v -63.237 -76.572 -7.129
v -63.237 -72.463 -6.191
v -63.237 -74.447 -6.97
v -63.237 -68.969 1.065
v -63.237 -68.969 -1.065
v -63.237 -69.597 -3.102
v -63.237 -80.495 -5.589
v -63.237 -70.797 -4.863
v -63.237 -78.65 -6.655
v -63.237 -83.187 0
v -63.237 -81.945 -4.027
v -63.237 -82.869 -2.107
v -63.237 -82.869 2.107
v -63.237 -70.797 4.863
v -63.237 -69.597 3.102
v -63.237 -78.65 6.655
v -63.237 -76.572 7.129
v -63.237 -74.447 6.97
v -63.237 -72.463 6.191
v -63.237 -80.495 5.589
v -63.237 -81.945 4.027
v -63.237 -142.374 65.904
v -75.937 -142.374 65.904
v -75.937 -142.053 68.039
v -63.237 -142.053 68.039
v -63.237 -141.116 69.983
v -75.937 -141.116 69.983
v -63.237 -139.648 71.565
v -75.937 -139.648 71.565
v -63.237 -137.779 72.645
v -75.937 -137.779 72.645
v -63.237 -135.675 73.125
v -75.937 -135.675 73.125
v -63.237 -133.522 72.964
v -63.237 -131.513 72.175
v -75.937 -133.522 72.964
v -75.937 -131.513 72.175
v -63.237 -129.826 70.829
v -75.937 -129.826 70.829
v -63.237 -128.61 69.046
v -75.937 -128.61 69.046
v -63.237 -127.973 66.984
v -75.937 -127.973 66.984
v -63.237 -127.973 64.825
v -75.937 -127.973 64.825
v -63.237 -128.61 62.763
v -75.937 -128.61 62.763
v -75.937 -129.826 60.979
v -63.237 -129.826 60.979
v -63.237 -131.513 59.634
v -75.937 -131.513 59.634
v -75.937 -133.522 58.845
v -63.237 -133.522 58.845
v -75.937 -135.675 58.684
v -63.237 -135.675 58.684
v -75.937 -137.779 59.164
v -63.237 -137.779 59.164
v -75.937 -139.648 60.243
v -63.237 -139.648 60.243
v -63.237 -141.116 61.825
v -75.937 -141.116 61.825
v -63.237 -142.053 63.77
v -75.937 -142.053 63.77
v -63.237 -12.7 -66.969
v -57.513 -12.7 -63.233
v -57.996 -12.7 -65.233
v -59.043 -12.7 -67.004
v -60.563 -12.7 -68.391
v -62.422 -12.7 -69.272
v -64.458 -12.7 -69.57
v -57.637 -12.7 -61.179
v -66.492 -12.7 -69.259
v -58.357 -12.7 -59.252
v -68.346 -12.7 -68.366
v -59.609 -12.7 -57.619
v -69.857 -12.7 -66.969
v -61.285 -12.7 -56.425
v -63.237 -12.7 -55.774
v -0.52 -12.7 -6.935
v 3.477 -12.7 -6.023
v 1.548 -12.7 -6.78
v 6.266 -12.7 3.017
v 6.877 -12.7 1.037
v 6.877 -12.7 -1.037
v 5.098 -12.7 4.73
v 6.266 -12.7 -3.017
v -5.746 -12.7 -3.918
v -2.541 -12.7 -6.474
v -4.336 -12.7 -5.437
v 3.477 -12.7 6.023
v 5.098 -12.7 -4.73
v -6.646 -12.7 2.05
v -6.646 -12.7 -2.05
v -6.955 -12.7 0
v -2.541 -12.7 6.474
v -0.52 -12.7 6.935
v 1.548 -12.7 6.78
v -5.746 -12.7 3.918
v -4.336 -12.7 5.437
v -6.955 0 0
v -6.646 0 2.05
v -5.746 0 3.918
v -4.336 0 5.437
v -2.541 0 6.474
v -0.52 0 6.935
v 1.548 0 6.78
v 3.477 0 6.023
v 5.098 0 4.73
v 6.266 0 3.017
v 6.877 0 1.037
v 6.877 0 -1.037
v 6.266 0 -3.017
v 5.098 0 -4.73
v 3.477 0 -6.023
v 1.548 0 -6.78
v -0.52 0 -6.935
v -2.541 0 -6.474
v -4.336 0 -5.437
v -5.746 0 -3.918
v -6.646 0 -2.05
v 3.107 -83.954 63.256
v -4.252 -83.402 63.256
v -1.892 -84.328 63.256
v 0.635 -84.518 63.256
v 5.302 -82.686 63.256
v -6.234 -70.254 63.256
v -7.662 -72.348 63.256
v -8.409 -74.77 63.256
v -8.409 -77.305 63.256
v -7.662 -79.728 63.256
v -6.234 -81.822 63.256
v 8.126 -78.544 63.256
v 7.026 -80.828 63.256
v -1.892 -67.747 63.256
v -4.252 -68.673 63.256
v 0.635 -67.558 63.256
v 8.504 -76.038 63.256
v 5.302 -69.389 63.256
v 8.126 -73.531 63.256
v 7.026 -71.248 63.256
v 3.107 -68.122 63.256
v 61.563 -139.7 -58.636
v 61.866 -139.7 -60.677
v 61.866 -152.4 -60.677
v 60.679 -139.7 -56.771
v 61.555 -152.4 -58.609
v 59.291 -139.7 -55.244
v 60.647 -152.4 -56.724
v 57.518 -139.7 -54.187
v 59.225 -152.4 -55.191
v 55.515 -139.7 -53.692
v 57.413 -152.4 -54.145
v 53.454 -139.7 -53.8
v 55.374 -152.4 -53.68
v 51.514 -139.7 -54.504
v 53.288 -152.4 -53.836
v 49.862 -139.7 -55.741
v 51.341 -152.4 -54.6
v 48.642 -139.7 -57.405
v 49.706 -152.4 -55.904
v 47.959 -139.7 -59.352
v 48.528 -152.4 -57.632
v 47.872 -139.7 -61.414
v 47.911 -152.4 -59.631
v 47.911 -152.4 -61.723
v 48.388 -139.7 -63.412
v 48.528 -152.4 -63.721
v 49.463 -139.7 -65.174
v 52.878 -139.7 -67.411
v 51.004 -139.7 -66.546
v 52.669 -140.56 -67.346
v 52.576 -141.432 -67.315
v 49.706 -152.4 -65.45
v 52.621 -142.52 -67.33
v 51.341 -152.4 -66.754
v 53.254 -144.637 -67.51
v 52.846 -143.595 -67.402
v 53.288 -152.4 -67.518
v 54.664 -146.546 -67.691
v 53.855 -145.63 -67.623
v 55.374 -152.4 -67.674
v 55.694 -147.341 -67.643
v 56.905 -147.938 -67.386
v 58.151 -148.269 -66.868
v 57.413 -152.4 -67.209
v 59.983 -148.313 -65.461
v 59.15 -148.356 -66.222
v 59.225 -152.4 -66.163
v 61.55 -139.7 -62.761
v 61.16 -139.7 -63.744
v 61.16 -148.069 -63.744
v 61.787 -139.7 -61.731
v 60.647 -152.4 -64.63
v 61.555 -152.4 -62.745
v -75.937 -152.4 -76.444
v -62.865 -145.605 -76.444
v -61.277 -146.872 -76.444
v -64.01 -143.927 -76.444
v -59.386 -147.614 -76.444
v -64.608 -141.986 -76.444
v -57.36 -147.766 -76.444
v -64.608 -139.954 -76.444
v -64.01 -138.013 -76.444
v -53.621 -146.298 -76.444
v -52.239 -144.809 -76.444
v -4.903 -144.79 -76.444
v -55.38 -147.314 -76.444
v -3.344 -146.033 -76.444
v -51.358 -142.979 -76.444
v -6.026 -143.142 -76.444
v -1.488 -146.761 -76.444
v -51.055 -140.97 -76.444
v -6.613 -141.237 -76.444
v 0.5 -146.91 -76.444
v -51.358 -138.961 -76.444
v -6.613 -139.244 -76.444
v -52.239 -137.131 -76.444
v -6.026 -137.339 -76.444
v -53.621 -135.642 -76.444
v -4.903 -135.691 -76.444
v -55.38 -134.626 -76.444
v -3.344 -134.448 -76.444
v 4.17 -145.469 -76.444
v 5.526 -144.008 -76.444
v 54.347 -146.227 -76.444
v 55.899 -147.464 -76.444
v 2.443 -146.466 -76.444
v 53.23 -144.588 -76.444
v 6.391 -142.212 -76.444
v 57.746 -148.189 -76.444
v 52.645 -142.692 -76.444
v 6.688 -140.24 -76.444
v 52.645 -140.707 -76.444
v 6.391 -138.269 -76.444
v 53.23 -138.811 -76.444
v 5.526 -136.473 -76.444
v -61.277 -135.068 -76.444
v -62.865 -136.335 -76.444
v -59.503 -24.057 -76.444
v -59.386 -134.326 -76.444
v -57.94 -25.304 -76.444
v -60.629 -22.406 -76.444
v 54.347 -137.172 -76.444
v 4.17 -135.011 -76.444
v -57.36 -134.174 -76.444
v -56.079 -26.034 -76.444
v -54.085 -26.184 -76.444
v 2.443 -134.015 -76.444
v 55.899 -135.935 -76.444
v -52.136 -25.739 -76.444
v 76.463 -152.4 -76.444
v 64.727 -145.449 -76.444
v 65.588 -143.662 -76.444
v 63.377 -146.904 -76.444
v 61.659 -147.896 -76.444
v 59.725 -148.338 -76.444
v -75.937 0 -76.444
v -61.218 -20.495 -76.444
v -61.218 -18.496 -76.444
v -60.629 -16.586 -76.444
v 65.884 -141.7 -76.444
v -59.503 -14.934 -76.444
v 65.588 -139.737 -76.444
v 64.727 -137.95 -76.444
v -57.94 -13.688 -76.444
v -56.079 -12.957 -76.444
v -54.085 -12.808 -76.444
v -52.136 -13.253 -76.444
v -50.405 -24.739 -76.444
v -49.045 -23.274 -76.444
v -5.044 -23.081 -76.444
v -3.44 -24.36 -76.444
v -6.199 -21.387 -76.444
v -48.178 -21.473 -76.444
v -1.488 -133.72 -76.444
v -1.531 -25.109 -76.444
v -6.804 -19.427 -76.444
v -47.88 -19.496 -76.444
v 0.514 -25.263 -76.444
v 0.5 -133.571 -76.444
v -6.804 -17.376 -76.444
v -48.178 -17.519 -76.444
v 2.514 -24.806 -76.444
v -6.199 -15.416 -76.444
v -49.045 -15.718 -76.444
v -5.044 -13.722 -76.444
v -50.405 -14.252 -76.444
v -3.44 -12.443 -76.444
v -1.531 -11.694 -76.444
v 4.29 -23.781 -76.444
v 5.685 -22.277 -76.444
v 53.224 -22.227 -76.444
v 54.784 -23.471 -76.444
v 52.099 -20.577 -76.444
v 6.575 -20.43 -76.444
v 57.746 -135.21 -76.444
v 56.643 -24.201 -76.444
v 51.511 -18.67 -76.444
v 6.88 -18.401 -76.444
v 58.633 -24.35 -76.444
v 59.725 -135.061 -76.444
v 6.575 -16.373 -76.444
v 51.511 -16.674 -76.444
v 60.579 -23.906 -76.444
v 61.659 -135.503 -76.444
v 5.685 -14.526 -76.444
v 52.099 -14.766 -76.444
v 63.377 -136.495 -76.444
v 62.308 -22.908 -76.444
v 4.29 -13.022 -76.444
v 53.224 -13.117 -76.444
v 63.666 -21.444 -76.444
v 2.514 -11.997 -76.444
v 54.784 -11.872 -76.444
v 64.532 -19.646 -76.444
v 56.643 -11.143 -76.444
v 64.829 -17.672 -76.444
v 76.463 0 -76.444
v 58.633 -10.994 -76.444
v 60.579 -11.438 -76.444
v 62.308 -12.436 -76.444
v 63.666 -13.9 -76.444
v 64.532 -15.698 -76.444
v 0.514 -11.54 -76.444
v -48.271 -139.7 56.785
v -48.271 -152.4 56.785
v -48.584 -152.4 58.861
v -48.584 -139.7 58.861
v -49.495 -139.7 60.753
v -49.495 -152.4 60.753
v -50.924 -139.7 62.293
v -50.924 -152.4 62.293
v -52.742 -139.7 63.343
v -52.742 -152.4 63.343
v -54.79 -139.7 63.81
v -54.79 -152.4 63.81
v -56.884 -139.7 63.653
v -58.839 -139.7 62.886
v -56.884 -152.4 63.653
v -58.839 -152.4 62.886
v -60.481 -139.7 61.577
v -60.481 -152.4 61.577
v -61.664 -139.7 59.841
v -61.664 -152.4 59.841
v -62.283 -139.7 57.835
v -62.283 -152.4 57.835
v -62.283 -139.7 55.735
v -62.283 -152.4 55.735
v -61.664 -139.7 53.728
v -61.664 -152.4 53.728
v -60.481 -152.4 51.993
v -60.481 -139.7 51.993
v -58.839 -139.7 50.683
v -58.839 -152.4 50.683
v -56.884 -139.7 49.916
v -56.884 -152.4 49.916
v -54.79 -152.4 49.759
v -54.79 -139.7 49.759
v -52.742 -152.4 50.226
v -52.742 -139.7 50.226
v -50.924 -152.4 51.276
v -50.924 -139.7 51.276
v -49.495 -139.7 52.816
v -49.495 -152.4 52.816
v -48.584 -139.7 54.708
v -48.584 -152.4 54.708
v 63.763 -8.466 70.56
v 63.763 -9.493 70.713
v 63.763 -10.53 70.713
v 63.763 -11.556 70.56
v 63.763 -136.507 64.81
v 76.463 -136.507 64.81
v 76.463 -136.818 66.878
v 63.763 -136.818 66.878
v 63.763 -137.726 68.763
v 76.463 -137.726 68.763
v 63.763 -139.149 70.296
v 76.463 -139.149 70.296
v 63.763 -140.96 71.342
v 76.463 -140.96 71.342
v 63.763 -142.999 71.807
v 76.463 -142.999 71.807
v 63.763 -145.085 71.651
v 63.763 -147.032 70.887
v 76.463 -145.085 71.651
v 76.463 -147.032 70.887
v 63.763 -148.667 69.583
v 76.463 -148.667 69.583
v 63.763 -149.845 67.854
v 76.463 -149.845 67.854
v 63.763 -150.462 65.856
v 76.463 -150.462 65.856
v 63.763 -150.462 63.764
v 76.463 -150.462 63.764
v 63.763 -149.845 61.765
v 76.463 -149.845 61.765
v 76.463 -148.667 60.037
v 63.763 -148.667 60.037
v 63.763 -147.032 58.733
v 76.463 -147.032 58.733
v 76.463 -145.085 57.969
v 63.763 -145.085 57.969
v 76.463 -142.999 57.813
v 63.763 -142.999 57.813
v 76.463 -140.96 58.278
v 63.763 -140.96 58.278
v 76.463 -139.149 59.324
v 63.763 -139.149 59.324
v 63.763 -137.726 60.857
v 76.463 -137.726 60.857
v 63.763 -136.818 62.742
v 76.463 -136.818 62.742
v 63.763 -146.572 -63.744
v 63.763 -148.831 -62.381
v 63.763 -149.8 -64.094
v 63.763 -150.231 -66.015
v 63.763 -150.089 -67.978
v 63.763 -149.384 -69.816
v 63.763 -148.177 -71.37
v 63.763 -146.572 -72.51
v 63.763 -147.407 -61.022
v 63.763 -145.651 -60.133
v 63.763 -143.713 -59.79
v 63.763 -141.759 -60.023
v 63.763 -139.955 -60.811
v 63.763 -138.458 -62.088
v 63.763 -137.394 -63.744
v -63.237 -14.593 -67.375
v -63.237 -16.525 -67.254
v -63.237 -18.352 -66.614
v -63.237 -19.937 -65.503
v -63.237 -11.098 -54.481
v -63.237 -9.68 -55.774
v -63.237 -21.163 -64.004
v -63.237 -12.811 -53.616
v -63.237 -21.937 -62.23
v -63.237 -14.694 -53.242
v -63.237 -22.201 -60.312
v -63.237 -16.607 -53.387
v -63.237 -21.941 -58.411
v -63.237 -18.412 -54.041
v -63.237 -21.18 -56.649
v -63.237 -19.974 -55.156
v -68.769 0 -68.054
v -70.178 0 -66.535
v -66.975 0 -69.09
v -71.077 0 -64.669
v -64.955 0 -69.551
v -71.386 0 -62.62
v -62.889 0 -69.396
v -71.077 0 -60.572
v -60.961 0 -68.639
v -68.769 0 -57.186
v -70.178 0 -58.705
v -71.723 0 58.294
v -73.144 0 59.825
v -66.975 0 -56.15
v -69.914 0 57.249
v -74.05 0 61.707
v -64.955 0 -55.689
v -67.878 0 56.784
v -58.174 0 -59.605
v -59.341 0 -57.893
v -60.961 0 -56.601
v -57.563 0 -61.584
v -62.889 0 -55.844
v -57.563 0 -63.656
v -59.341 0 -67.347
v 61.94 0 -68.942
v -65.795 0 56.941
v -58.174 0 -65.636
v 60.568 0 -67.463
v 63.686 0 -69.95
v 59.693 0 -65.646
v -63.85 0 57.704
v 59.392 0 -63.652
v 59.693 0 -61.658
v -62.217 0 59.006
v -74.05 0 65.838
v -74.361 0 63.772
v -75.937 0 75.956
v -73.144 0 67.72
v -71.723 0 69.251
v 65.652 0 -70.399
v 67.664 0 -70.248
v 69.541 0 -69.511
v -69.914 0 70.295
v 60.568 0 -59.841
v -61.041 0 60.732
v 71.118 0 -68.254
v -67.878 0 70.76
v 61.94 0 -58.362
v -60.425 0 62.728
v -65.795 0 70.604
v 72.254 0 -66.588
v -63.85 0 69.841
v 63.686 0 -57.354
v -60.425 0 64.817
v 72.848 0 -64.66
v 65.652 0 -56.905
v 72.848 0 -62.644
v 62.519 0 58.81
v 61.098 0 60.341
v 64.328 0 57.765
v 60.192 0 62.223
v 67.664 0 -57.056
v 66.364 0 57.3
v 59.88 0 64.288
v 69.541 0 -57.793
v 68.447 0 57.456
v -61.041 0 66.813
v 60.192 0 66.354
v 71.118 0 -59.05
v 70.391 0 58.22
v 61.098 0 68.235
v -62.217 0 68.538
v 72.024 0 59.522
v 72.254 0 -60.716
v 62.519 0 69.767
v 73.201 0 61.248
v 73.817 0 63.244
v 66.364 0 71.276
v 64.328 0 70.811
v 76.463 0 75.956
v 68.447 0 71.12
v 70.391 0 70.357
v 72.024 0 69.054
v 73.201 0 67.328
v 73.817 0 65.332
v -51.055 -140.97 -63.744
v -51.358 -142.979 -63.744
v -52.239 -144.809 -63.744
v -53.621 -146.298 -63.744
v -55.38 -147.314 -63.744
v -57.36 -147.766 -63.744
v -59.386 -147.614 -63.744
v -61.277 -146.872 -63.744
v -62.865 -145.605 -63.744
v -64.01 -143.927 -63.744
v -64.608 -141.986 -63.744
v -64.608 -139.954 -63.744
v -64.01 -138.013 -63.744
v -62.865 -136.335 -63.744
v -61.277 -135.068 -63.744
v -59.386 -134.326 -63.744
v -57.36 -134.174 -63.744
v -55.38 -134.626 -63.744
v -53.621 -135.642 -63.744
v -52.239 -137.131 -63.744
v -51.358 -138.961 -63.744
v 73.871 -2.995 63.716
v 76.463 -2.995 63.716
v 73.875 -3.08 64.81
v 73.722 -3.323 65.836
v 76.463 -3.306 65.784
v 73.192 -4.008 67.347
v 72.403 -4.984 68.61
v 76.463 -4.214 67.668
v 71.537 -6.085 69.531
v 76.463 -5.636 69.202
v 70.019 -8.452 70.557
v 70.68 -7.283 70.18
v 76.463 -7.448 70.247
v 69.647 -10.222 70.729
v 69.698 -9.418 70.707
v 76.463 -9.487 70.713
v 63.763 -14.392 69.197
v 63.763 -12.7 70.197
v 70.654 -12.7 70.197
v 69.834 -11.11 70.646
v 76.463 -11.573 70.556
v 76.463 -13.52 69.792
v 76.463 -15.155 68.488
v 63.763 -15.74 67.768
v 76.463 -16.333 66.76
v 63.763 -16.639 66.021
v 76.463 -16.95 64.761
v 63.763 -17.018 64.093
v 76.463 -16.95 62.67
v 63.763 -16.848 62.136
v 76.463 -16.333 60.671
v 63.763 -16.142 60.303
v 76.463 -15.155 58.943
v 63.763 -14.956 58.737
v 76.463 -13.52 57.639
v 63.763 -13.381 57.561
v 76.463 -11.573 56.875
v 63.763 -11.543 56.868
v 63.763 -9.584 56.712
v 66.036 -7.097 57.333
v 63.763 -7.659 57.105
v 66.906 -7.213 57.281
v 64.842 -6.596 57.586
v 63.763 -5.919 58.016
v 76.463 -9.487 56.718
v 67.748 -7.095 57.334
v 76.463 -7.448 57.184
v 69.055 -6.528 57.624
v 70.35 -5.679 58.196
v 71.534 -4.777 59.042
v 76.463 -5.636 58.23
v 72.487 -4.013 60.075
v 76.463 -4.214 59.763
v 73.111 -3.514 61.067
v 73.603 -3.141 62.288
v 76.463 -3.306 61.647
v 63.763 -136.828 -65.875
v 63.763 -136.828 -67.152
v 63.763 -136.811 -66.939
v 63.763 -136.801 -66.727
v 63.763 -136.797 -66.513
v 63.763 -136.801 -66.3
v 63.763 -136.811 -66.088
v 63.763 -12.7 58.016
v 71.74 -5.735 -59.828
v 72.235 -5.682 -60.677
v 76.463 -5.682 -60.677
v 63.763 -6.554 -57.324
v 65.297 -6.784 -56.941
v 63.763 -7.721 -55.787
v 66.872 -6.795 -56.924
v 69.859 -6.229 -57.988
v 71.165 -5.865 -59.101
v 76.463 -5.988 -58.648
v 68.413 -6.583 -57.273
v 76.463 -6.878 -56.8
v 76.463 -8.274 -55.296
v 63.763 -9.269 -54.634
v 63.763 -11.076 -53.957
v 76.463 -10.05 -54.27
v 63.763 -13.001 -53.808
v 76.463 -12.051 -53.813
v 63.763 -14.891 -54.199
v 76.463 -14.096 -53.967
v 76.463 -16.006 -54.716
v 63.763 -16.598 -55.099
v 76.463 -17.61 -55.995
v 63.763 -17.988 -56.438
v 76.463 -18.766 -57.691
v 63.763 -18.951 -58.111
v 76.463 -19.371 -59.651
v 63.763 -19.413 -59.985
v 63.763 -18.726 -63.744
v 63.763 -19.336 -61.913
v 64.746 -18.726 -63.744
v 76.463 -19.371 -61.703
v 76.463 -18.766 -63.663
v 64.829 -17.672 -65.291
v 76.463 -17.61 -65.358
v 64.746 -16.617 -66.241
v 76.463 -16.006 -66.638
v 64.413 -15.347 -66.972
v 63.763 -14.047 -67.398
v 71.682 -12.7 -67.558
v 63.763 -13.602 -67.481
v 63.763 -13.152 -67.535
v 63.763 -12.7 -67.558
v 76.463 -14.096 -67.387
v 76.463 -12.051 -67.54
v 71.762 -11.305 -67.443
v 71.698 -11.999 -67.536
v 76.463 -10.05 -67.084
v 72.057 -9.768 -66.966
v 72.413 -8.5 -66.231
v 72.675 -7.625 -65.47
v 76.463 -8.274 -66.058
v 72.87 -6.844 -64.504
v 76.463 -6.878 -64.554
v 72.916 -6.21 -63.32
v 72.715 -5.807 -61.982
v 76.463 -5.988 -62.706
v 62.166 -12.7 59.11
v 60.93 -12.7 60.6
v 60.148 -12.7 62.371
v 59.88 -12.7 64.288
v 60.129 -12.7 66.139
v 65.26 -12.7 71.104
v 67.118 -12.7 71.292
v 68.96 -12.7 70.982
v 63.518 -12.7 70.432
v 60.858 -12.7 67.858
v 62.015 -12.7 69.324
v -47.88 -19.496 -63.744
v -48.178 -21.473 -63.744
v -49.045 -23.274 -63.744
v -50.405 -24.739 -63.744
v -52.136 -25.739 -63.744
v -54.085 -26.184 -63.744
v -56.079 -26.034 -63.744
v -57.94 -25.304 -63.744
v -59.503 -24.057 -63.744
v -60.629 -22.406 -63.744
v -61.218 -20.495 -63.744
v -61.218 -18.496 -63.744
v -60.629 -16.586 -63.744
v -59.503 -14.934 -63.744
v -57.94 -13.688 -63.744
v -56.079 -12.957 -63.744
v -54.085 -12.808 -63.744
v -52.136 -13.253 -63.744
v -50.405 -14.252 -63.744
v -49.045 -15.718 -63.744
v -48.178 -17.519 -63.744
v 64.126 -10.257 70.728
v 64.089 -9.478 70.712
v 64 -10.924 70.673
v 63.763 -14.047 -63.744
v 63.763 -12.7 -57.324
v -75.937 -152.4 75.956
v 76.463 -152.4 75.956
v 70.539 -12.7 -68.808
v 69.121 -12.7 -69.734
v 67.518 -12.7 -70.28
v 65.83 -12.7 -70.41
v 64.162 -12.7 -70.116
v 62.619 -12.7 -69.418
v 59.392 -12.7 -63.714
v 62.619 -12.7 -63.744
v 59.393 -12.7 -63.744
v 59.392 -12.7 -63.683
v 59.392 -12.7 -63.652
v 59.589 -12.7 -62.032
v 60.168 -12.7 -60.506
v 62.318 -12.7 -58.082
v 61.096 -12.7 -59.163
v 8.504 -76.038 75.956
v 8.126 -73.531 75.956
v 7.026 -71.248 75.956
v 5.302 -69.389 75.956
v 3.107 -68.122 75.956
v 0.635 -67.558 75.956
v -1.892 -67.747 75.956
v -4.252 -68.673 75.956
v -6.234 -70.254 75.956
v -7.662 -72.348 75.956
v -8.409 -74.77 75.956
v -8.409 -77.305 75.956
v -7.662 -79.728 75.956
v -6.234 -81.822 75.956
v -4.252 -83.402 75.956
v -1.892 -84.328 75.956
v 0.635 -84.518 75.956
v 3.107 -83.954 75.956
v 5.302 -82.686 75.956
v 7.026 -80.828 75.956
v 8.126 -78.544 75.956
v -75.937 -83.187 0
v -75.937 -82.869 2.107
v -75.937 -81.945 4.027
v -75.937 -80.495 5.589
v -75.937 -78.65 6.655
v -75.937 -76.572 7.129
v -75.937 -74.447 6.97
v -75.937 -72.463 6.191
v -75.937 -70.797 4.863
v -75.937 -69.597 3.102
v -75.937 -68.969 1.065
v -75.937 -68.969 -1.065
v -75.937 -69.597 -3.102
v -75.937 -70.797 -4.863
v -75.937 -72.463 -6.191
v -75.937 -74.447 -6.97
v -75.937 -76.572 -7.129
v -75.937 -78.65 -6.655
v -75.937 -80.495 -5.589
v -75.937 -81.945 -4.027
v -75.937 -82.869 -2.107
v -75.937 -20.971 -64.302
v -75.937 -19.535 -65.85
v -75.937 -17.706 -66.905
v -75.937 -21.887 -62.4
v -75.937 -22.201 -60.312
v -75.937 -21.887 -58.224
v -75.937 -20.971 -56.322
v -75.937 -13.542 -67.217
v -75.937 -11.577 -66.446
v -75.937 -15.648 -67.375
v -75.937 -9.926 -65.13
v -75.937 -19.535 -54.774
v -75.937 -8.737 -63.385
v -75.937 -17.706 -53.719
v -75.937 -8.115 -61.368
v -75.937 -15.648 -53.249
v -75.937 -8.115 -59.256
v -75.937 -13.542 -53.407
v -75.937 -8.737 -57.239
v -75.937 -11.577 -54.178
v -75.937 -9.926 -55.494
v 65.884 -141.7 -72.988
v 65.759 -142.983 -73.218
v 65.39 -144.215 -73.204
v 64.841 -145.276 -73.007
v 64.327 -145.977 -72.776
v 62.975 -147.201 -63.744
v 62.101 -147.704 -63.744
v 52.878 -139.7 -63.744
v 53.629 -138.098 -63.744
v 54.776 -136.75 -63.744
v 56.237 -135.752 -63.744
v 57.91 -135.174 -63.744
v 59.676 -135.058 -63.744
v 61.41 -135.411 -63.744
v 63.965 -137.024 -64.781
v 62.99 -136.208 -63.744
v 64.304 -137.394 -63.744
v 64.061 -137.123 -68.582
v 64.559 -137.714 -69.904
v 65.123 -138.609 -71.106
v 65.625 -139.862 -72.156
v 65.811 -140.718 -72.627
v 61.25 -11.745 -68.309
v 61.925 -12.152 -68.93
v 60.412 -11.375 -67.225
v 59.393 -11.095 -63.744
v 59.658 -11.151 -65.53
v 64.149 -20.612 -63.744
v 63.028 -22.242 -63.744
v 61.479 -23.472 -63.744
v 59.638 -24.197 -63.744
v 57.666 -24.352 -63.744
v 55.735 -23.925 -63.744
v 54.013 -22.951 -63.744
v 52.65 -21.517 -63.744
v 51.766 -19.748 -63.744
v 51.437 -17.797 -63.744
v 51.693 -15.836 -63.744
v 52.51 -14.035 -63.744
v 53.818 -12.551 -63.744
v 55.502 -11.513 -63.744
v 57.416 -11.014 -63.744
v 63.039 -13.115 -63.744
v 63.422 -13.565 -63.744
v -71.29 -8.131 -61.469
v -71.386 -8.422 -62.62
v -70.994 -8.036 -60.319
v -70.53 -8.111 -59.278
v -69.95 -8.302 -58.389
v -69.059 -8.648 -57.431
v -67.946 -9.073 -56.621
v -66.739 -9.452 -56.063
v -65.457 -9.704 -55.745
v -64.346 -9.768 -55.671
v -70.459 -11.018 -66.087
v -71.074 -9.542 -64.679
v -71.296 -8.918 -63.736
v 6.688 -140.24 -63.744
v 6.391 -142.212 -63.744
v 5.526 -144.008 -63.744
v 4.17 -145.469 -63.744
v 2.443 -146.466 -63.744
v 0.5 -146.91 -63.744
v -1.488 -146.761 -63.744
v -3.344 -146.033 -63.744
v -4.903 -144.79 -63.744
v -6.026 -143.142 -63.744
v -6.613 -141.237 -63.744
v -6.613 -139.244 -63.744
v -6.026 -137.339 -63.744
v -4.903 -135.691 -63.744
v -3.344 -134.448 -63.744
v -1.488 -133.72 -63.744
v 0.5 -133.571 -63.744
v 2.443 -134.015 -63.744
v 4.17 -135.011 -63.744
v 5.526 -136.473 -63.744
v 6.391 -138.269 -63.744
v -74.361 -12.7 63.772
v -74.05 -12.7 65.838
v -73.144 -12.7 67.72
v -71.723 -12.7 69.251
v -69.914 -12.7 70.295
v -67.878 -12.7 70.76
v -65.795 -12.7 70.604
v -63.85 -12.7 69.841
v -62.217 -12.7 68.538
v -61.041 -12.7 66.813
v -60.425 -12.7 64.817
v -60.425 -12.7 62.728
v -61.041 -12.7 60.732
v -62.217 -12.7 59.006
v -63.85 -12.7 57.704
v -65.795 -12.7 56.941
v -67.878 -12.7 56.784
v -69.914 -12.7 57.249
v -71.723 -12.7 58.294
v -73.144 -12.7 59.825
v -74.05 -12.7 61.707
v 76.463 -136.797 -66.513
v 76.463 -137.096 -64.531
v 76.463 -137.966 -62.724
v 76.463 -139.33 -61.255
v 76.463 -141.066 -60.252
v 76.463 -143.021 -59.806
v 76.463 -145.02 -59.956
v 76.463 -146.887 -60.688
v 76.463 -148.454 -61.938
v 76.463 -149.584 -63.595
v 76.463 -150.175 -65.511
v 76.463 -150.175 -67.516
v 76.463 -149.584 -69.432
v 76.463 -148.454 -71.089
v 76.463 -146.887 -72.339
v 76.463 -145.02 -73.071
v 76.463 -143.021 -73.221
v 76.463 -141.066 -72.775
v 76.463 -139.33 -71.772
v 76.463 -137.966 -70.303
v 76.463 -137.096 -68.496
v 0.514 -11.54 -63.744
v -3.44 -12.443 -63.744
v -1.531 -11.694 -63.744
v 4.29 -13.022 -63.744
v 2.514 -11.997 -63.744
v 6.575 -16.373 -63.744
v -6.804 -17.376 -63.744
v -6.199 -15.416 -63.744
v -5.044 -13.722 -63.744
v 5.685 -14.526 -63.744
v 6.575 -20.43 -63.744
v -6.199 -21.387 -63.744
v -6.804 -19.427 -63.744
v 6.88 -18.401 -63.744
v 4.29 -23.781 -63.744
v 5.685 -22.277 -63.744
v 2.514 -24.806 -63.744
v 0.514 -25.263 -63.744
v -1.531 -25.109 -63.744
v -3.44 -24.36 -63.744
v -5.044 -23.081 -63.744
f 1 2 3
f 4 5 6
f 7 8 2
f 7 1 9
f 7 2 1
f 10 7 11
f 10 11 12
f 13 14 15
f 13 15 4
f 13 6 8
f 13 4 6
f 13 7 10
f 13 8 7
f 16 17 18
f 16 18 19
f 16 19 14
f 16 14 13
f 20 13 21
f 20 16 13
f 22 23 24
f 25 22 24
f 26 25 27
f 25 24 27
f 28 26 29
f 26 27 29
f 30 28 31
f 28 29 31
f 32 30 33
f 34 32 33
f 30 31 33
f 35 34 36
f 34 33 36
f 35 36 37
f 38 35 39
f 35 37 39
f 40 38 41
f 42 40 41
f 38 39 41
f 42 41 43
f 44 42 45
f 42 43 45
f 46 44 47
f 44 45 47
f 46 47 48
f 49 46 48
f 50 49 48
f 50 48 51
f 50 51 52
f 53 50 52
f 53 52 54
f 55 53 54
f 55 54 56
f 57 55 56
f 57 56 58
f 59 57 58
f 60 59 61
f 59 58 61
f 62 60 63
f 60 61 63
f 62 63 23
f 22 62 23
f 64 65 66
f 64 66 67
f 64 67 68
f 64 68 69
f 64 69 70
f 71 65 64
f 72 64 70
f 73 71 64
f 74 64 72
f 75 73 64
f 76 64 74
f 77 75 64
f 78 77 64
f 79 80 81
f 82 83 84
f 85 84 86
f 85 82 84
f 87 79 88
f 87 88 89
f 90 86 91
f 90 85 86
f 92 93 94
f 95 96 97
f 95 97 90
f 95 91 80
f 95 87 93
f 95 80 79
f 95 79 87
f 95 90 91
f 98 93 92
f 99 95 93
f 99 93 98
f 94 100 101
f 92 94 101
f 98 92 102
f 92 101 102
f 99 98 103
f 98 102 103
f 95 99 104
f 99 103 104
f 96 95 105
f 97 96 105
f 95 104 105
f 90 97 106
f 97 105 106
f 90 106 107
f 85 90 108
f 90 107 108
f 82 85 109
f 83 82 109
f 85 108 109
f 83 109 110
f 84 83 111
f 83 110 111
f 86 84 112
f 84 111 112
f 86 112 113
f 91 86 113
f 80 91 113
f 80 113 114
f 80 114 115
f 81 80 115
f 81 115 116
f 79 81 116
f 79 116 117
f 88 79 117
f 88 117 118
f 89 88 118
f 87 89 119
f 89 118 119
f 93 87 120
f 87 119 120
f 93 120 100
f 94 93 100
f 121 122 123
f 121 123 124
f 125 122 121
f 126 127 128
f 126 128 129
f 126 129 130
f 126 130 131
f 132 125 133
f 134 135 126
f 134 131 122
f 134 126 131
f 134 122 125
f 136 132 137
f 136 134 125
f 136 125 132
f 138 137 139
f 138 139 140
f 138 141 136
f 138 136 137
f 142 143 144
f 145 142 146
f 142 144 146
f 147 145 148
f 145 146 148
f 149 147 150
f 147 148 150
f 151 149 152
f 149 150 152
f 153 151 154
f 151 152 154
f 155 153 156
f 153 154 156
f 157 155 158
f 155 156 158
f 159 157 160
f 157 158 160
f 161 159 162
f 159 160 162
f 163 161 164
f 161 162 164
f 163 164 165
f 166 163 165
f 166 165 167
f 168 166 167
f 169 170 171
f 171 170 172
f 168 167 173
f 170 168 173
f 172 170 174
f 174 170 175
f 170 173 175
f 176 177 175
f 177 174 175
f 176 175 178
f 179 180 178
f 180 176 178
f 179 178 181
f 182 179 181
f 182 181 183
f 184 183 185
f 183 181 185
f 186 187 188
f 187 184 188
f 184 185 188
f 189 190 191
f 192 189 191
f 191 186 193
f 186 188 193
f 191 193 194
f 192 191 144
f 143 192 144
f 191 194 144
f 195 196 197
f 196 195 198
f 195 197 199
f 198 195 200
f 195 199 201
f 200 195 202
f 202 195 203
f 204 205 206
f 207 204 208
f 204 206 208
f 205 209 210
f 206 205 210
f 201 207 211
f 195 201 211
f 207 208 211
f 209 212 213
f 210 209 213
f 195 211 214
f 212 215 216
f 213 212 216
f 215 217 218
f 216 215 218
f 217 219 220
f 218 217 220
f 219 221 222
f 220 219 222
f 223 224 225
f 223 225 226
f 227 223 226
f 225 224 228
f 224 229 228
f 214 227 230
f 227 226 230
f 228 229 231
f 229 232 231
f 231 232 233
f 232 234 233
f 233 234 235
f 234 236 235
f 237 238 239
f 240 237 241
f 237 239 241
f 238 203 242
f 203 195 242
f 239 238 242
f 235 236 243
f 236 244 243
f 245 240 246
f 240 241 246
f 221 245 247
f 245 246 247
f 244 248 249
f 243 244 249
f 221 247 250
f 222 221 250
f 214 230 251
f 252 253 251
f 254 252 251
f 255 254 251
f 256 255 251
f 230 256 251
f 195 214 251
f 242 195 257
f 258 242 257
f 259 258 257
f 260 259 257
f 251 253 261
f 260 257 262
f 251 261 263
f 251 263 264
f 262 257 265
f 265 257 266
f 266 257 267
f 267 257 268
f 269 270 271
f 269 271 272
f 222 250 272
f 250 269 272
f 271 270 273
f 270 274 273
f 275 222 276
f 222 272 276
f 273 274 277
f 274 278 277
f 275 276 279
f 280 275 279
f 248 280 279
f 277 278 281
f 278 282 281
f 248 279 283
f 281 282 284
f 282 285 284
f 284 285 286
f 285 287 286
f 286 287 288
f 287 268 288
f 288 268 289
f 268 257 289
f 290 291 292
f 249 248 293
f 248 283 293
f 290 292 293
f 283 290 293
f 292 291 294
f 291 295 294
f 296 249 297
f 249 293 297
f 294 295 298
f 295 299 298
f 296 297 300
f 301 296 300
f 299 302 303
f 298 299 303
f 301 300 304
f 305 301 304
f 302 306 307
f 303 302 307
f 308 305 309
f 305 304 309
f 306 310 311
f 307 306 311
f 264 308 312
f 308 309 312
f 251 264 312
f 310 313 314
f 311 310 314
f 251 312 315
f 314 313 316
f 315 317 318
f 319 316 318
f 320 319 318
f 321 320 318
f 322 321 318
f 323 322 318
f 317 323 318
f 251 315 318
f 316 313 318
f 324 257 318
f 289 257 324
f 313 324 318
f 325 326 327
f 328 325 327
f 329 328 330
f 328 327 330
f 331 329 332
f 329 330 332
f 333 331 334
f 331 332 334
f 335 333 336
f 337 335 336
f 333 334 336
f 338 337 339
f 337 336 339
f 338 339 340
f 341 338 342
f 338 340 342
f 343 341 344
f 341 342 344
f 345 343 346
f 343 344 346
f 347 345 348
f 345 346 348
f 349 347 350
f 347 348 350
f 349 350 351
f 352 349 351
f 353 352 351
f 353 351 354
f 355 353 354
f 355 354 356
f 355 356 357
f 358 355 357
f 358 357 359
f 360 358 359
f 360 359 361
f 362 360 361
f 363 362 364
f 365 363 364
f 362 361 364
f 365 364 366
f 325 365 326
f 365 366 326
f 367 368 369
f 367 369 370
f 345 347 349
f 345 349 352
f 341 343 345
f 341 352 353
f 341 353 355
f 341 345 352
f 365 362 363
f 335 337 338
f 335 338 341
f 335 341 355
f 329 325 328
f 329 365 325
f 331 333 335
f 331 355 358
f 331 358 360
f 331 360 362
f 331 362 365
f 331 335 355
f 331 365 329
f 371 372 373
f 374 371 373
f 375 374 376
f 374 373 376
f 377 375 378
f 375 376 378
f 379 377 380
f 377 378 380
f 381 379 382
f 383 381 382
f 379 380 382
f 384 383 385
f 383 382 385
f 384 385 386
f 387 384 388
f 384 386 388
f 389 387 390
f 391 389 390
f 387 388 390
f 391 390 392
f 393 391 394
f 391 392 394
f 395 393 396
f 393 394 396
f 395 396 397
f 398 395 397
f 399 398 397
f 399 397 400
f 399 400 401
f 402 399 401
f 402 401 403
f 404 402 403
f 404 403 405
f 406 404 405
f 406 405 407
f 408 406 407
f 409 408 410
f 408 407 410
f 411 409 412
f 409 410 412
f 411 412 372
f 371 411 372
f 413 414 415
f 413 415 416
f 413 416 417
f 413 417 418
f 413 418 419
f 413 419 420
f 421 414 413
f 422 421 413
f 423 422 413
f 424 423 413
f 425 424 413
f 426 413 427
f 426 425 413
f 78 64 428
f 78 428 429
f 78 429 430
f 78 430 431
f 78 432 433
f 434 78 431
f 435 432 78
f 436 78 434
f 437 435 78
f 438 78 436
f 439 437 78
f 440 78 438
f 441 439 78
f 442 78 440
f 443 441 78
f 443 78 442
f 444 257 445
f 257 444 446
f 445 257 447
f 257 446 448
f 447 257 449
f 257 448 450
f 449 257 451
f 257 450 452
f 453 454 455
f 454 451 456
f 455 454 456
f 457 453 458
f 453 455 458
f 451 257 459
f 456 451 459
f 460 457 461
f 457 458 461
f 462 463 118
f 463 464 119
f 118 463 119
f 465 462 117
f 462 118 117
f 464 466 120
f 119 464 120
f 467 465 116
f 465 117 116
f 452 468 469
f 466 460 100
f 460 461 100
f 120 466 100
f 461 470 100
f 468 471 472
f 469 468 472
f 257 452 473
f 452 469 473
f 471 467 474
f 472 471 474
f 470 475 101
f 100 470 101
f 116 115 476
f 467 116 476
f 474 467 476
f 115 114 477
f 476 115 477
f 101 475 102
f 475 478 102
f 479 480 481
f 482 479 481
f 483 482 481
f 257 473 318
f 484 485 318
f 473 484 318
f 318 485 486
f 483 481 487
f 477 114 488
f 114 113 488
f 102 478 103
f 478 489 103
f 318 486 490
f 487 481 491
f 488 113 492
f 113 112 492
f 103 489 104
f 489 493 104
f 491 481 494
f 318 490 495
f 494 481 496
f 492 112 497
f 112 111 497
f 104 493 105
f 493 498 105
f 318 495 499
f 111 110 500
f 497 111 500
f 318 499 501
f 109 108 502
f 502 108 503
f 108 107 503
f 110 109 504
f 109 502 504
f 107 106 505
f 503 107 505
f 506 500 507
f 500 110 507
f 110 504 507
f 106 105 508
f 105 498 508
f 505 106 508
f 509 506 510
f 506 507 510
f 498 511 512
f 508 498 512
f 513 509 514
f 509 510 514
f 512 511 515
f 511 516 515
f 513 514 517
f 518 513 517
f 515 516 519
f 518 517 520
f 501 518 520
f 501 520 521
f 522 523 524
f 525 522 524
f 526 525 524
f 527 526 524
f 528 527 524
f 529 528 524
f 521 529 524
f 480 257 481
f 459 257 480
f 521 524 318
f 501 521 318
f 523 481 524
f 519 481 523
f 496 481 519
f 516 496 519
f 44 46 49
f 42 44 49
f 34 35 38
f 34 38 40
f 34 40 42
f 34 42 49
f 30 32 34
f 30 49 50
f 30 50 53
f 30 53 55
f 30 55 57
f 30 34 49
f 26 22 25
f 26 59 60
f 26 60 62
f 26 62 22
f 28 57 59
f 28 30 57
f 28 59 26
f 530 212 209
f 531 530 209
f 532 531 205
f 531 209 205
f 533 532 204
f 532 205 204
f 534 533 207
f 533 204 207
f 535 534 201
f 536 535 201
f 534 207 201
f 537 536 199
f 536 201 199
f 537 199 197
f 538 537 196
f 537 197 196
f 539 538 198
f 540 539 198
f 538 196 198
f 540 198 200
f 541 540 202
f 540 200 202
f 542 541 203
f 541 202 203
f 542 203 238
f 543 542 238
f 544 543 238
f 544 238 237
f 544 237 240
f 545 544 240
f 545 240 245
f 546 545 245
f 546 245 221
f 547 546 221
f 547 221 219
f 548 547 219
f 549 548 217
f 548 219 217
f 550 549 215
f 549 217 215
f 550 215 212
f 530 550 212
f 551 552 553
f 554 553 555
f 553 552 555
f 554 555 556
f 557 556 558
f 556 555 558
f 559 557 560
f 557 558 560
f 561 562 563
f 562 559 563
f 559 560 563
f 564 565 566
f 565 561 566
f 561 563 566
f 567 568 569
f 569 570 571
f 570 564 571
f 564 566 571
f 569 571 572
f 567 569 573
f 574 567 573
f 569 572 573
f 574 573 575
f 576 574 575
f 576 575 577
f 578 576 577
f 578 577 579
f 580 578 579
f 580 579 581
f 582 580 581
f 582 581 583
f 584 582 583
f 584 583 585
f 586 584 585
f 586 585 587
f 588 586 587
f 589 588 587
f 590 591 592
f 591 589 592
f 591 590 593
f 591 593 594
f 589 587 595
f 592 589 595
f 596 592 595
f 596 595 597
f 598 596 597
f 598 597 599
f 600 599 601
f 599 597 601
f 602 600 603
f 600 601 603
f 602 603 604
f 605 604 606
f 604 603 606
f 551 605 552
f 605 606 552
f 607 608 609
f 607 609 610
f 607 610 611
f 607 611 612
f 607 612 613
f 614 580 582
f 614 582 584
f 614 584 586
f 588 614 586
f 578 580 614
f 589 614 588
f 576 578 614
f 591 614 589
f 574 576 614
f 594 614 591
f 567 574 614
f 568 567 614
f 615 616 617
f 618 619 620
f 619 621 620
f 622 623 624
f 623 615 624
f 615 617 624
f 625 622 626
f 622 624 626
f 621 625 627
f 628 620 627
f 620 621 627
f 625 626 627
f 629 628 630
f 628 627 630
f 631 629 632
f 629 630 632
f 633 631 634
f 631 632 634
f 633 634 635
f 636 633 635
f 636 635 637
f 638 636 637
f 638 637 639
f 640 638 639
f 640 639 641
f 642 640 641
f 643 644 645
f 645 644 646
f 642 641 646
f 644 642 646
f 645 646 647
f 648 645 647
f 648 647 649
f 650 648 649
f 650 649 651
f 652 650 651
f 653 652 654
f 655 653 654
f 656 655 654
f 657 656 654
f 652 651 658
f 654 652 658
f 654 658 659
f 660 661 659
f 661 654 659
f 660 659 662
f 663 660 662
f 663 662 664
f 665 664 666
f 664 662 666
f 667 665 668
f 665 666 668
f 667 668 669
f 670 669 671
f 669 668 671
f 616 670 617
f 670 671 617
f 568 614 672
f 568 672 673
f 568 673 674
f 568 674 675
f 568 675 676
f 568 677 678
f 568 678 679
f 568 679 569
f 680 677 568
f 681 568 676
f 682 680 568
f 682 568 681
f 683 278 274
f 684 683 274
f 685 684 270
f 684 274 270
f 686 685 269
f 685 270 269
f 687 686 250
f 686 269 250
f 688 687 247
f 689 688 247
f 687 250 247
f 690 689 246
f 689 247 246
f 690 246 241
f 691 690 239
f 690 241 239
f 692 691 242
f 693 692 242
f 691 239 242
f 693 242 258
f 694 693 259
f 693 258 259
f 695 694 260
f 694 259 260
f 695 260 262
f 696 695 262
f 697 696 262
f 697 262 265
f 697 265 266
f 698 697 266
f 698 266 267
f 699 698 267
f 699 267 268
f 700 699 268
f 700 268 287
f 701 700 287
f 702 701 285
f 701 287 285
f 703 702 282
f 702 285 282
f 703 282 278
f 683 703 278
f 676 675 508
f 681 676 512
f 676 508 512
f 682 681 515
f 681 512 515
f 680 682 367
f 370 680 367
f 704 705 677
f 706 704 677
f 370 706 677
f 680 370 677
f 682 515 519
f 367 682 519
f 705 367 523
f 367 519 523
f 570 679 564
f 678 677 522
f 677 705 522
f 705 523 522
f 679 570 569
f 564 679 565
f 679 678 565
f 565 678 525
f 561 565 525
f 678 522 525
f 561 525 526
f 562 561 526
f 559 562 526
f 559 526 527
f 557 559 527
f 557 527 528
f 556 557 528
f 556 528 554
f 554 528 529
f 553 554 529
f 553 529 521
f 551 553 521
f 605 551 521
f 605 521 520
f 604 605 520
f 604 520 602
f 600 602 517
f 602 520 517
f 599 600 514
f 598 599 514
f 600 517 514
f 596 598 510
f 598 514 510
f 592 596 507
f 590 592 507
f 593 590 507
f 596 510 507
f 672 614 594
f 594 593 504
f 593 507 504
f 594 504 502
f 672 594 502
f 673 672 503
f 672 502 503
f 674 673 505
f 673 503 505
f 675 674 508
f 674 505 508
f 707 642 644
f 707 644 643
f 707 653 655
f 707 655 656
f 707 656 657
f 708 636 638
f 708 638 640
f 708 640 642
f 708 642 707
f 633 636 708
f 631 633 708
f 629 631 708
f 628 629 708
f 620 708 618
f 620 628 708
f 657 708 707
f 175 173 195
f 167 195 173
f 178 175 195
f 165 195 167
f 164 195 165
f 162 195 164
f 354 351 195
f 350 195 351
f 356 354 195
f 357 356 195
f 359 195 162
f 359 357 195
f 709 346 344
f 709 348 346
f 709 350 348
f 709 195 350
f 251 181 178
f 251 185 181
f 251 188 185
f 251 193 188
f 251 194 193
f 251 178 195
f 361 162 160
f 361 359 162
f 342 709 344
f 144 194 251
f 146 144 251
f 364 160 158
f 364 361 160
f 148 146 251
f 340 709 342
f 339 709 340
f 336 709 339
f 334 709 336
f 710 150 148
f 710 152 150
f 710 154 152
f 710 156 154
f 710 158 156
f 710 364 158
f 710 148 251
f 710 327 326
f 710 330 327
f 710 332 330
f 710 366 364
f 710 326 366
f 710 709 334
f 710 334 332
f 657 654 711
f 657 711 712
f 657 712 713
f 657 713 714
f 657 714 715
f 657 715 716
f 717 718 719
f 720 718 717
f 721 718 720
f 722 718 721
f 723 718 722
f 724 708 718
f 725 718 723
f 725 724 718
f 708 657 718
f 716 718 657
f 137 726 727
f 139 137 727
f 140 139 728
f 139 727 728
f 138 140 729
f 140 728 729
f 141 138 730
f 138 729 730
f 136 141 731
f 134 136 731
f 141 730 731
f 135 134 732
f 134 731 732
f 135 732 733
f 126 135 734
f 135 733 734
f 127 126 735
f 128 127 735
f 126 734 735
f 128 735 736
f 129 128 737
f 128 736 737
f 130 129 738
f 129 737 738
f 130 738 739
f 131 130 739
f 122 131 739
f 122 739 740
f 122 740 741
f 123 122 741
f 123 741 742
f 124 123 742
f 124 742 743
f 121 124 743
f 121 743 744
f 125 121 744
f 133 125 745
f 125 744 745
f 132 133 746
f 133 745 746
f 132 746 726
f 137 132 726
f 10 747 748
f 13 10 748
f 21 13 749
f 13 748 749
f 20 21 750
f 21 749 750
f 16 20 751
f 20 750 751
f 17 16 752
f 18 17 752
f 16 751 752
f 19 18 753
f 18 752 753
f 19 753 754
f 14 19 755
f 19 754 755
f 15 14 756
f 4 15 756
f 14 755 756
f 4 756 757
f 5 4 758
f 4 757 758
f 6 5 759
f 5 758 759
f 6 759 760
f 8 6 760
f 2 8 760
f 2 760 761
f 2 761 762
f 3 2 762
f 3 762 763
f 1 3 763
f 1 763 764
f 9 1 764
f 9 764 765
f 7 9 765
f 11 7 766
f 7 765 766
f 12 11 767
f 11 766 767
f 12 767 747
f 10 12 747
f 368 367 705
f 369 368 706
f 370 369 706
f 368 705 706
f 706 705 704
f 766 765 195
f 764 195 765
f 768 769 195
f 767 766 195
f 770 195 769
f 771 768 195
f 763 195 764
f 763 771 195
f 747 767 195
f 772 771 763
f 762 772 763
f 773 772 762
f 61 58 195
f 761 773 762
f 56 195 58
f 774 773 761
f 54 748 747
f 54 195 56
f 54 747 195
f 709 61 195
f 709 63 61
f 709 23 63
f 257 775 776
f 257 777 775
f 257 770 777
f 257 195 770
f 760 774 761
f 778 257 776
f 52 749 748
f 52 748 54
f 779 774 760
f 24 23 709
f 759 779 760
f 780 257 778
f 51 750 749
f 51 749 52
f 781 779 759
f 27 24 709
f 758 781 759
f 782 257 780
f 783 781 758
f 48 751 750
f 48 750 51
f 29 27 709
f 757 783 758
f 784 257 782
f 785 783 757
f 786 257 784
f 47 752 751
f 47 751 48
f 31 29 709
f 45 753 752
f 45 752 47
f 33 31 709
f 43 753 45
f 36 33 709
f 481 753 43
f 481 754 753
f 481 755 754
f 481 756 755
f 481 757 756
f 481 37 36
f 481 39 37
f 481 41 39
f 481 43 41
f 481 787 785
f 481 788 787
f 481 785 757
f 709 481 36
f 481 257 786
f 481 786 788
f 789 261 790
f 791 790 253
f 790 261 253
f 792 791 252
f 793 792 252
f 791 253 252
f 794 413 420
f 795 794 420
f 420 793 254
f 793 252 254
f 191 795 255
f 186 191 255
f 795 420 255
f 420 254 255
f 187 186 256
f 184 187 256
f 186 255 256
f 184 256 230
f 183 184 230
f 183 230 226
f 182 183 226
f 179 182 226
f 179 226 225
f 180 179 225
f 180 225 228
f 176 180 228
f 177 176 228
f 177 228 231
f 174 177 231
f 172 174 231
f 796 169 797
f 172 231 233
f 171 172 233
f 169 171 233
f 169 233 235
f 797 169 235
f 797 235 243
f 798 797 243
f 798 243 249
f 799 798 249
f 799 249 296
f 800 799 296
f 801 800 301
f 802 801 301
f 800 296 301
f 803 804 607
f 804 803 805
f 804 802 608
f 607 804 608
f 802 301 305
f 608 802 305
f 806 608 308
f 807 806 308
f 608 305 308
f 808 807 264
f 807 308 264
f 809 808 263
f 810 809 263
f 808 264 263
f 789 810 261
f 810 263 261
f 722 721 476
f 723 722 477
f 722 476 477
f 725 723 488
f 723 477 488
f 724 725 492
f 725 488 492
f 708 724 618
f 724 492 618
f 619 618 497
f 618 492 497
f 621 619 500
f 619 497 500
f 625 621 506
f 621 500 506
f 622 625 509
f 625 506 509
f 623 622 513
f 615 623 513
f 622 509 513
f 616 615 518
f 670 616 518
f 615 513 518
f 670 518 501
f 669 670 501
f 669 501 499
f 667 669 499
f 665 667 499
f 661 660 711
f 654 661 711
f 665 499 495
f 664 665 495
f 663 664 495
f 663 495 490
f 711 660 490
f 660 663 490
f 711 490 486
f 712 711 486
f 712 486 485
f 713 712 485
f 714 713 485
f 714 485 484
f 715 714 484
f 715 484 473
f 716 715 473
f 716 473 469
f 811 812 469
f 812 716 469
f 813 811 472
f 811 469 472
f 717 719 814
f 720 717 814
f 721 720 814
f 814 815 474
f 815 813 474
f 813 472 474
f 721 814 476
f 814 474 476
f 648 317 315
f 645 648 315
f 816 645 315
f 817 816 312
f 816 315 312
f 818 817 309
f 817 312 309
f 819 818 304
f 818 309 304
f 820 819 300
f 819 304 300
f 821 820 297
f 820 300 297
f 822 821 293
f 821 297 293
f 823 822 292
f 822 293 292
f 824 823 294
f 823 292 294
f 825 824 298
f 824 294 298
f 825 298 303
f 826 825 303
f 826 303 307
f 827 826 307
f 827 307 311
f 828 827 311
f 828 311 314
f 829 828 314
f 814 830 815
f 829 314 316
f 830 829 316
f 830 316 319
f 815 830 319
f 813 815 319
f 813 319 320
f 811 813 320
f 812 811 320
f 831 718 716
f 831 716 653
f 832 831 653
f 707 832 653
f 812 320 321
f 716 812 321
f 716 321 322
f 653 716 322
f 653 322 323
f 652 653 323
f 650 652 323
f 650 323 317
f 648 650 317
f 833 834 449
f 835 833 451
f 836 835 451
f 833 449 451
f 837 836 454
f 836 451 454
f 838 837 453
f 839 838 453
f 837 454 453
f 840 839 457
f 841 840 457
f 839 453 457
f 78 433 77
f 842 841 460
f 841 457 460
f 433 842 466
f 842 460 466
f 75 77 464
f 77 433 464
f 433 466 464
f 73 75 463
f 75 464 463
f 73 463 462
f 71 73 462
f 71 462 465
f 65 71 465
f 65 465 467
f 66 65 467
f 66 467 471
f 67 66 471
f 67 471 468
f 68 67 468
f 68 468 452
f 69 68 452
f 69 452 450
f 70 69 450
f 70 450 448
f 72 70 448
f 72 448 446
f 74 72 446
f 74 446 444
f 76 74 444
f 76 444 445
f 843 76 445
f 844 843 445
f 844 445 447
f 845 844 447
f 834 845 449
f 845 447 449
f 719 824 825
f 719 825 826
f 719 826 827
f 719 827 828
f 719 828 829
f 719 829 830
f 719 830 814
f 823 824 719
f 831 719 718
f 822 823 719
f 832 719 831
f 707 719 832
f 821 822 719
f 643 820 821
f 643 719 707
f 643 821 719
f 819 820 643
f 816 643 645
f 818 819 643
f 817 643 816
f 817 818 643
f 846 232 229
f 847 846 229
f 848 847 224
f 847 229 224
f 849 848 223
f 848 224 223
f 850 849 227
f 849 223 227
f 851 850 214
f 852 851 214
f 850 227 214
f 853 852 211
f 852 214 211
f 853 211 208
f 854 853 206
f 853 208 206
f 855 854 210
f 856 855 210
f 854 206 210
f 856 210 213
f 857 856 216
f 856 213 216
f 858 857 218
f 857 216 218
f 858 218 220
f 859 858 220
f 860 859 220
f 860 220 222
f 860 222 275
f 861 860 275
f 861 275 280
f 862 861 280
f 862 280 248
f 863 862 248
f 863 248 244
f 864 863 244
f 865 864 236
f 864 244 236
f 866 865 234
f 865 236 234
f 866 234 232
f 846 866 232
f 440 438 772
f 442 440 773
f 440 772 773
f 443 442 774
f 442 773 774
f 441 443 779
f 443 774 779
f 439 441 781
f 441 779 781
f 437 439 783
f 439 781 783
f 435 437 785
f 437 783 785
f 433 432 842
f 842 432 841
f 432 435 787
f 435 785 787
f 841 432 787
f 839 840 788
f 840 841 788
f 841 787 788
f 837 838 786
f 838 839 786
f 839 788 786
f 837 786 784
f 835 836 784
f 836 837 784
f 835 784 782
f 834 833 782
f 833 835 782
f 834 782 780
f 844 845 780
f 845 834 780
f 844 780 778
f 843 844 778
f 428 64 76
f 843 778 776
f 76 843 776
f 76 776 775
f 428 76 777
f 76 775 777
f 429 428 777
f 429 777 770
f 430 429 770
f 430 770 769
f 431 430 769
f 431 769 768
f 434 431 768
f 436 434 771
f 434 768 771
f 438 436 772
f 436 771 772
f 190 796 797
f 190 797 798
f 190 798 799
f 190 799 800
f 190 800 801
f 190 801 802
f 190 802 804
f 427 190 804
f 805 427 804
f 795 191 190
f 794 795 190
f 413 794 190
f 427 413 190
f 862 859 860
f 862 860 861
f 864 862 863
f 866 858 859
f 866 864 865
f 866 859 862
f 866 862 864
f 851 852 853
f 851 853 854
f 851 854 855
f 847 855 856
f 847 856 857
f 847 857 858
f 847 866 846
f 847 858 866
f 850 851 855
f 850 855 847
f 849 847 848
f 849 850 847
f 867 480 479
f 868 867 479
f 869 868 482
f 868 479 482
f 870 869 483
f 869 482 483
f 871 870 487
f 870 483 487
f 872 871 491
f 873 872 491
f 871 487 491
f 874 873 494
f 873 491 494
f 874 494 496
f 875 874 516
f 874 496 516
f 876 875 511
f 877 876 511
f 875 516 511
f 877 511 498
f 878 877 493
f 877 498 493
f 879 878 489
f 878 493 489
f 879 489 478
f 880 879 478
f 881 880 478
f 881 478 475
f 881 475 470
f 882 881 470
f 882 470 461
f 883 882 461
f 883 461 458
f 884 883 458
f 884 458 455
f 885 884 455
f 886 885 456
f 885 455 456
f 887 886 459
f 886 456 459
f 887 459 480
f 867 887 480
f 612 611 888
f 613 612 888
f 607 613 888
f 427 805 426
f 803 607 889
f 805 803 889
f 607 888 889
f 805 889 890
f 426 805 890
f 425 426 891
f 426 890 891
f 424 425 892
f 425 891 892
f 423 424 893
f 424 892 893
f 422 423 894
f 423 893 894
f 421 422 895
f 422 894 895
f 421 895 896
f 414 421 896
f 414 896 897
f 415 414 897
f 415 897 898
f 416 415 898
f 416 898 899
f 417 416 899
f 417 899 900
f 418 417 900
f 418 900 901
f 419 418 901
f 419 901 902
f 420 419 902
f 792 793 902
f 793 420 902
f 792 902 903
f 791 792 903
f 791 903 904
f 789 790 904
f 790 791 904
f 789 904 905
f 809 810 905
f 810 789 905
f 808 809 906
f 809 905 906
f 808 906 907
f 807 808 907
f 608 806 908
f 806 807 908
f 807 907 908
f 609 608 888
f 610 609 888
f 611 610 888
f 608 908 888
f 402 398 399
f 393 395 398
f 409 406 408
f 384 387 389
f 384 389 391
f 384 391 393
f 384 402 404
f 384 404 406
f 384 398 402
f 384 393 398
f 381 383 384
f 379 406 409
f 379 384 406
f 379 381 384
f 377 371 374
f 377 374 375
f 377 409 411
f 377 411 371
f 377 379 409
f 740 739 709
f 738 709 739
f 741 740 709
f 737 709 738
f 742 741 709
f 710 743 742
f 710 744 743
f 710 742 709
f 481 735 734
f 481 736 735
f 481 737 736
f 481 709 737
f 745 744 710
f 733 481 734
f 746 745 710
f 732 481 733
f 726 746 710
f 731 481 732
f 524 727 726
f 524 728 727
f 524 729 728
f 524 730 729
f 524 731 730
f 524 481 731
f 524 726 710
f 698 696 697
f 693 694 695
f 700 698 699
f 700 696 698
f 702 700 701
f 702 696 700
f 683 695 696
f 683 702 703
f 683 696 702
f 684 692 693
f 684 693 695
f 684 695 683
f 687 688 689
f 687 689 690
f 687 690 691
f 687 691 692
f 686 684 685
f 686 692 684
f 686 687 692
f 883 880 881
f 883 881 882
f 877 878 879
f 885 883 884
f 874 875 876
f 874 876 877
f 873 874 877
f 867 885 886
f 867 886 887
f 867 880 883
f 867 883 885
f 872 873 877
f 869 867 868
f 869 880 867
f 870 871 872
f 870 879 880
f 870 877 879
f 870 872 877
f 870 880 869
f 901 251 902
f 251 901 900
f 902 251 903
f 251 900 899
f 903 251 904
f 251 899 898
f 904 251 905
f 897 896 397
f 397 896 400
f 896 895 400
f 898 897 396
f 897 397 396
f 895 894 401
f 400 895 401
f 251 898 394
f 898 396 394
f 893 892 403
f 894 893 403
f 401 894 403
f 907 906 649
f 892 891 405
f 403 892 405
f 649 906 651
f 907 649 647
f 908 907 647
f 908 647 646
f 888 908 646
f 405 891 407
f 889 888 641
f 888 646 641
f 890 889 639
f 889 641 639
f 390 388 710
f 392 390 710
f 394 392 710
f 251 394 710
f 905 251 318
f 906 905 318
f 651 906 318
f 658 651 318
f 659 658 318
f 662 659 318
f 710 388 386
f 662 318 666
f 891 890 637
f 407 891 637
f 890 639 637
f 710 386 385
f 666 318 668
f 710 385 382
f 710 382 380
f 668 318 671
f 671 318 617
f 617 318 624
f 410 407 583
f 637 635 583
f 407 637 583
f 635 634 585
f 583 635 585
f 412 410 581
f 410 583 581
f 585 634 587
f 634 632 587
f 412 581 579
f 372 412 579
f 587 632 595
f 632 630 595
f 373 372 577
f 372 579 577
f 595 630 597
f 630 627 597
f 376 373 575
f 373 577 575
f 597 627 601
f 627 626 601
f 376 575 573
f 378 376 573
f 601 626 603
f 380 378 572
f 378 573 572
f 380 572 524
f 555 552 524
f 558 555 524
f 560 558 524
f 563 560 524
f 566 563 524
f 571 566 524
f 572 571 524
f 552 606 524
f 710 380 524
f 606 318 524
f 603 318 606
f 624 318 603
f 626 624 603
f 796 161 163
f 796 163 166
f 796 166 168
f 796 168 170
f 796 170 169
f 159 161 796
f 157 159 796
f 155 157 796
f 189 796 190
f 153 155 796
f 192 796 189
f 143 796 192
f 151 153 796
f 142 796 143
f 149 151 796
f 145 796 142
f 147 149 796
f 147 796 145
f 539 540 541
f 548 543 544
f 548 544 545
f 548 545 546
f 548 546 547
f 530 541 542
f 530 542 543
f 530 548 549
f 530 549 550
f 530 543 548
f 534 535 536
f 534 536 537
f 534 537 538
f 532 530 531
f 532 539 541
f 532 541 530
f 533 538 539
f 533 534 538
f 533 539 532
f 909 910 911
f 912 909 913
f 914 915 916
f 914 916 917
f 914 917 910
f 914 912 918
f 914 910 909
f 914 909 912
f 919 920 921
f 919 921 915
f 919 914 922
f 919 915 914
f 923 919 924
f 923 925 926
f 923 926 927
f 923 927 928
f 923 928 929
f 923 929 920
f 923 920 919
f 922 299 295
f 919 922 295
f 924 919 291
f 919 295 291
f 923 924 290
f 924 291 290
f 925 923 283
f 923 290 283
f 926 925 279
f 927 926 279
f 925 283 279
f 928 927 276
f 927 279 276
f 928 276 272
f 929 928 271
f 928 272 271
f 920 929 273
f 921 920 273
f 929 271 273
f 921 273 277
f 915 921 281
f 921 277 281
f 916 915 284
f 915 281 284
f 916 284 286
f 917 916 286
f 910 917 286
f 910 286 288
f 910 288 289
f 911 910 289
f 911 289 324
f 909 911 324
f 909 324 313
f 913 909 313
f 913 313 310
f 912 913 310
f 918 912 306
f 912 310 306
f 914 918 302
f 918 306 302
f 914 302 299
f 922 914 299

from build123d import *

# Parameters (mm, degrees)
F0_W      = 152.4
F0_H      = 152.399992557
F1_DEPTH  = 152.4
F2_R      = 8.5037572656
F3_DEPTH  = 12.7
F4_R      = 7.0073319603
F4_R_2    = 6.9501235212
F4_R_3    = 6.7658122989
F5_DEPTH  = 12.7
F6_R      = 7.0073351943
F6_R_2    = 6.9545325537
F7_DEPTH  = 12.7
F8_R      = 7.0452123399
F8_R_2    = 7.0168230938
F9_DEPTH  = 12.7
F10_R     = 7.0828869948
F10_R_2   = 7.1489340482
F10_R_3   = 7.2408196542
F11_DEPTH = 12.7
F12_R     = 6.6966018478
F12_R_2   = 6.8804301319
F12_R_3   = 6.7065356098
F12_R_4   = 6.6881507526
F12_R_5   = 6.8147907528
F12_R_6   = 6.6567393836
F13_DEPTH = 12.7
F14_R     = 7.0168186878
F14_R_2   = 6.8827909579
F14_R_3   = 7.0168182521
F14_R_4   = 6.7263512429
F15_DEPTH = 12.7


with BuildPart() as f1:
    # F0 (on Front) → F1 (new body)
    with BuildSketch(Plane.XZ):
        with Locations((0.2630501986, -0.2443604171)):
            Rectangle(F0_W, F0_H)
    extrude(amount=F1_DEPTH)

    # F2 (on face) → F3 (cut)
    with BuildSketch(Plane.XY.offset(75.9556358614)):
        with Locations((0, -76.037876308)):
            Circle(F2_R)
    extrude(amount=-F3_DEPTH, mode=Mode.SUBTRACT)

    # F4 (on face) → F5 (cut)
    with BuildSketch(Plane(origin=(0, 0, 0), x_dir=(-1, 0, 0), z_dir=(0, 1, 0))):
        with Locations((67.3541128635, 63.7721791863)):
            Circle(F4_R)
        with Locations((64.4358173013, -62.6201629639)):
            Circle(F4_R_2)
        with Locations((-66.1580115557, -63.6519268155)):
            Circle(F4_R_3)
    extrude(amount=-F5_DEPTH, mode=Mode.SUBTRACT)

    # F6 (on face) → F7 (cut)
    with BuildSketch(Plane(origin=(0, 0, 0), x_dir=(-1, 0, 0), z_dir=(0, 1, 0))):
        with Locations((-66.8875873089, 64.2880648375)):
            Circle(F6_R)
        Circle(F6_R_2)
    extrude(amount=-F7_DEPTH, mode=Mode.SUBTRACT)

    # F8 (on face) → F9 (cut)
    with BuildSketch(Plane.XZ.offset(152.4)):
        with Locations((-55.3161352873, 56.7846298218)):
            Circle(F8_R)
        with Locations((54.8496097326, -60.6768615544)):
            Circle(F8_R_2)
    extrude(amount=-F9_DEPTH, mode=Mode.SUBTRACT)

    # F10 (on face) → F11 (cut)
    with BuildSketch(Plane(origin=(-75.9369498014, 0, 0), x_dir=(0, -1, 0), z_dir=(-1, 0, 0))):
        with Locations((15.1184033602, -60.3120736778)):
            Circle(F10_R)
        with Locations((76.037876308, 0)):
            Circle(F10_R_2)
        with Locations((135.1334154606, 65.9043118358)):
            Circle(F10_R_3)
    extrude(amount=-F11_DEPTH, mode=Mode.SUBTRACT)

    # F12 (on face) → F13 (cut)
    with BuildSketch(Plane(origin=(0, 0, -76.4443566957), x_dir=(1, 0, 0), z_dir=(0, 0, -1))):
        with Locations((58.1326968968, 17.6719166338)):
            Circle(F12_R)
        with Locations((0, 18.4014886618)):
            Circle(F12_R_2)
        with Locations((-54.5865595341, 19.4958504289)):
            Circle(F12_R_3)
        with Locations((0, 140.2404308319)):
            Circle(F12_R_4)
        with Locations((-57.8696429729, 140.9700065851)):
            Circle(F12_R_5)
        with Locations((59.2270568013, 141.6995823383)):
            Circle(F12_R_6)
    extrude(amount=-F13_DEPTH, mode=Mode.SUBTRACT)

    # F14 (on face) → F15 (cut)
    with BuildSketch(Plane.YZ.offset(76.4630501986)):
        with Locations((-10.0113833323, 63.7155920267)):
            Circle(F14_R)
        with Locations((-12.5648928806, -60.6768615544)):
            Circle(F14_R_2)
        with Locations((-143.5235142708, 64.8099482059)):
            Circle(F14_R_3)
        with Locations((-143.5235142708, -66.5134564042)):
            Circle(F14_R_4)
    extrude(amount=-F15_DEPTH, mode=Mode.SUBTRACT)


solid = f1.part
